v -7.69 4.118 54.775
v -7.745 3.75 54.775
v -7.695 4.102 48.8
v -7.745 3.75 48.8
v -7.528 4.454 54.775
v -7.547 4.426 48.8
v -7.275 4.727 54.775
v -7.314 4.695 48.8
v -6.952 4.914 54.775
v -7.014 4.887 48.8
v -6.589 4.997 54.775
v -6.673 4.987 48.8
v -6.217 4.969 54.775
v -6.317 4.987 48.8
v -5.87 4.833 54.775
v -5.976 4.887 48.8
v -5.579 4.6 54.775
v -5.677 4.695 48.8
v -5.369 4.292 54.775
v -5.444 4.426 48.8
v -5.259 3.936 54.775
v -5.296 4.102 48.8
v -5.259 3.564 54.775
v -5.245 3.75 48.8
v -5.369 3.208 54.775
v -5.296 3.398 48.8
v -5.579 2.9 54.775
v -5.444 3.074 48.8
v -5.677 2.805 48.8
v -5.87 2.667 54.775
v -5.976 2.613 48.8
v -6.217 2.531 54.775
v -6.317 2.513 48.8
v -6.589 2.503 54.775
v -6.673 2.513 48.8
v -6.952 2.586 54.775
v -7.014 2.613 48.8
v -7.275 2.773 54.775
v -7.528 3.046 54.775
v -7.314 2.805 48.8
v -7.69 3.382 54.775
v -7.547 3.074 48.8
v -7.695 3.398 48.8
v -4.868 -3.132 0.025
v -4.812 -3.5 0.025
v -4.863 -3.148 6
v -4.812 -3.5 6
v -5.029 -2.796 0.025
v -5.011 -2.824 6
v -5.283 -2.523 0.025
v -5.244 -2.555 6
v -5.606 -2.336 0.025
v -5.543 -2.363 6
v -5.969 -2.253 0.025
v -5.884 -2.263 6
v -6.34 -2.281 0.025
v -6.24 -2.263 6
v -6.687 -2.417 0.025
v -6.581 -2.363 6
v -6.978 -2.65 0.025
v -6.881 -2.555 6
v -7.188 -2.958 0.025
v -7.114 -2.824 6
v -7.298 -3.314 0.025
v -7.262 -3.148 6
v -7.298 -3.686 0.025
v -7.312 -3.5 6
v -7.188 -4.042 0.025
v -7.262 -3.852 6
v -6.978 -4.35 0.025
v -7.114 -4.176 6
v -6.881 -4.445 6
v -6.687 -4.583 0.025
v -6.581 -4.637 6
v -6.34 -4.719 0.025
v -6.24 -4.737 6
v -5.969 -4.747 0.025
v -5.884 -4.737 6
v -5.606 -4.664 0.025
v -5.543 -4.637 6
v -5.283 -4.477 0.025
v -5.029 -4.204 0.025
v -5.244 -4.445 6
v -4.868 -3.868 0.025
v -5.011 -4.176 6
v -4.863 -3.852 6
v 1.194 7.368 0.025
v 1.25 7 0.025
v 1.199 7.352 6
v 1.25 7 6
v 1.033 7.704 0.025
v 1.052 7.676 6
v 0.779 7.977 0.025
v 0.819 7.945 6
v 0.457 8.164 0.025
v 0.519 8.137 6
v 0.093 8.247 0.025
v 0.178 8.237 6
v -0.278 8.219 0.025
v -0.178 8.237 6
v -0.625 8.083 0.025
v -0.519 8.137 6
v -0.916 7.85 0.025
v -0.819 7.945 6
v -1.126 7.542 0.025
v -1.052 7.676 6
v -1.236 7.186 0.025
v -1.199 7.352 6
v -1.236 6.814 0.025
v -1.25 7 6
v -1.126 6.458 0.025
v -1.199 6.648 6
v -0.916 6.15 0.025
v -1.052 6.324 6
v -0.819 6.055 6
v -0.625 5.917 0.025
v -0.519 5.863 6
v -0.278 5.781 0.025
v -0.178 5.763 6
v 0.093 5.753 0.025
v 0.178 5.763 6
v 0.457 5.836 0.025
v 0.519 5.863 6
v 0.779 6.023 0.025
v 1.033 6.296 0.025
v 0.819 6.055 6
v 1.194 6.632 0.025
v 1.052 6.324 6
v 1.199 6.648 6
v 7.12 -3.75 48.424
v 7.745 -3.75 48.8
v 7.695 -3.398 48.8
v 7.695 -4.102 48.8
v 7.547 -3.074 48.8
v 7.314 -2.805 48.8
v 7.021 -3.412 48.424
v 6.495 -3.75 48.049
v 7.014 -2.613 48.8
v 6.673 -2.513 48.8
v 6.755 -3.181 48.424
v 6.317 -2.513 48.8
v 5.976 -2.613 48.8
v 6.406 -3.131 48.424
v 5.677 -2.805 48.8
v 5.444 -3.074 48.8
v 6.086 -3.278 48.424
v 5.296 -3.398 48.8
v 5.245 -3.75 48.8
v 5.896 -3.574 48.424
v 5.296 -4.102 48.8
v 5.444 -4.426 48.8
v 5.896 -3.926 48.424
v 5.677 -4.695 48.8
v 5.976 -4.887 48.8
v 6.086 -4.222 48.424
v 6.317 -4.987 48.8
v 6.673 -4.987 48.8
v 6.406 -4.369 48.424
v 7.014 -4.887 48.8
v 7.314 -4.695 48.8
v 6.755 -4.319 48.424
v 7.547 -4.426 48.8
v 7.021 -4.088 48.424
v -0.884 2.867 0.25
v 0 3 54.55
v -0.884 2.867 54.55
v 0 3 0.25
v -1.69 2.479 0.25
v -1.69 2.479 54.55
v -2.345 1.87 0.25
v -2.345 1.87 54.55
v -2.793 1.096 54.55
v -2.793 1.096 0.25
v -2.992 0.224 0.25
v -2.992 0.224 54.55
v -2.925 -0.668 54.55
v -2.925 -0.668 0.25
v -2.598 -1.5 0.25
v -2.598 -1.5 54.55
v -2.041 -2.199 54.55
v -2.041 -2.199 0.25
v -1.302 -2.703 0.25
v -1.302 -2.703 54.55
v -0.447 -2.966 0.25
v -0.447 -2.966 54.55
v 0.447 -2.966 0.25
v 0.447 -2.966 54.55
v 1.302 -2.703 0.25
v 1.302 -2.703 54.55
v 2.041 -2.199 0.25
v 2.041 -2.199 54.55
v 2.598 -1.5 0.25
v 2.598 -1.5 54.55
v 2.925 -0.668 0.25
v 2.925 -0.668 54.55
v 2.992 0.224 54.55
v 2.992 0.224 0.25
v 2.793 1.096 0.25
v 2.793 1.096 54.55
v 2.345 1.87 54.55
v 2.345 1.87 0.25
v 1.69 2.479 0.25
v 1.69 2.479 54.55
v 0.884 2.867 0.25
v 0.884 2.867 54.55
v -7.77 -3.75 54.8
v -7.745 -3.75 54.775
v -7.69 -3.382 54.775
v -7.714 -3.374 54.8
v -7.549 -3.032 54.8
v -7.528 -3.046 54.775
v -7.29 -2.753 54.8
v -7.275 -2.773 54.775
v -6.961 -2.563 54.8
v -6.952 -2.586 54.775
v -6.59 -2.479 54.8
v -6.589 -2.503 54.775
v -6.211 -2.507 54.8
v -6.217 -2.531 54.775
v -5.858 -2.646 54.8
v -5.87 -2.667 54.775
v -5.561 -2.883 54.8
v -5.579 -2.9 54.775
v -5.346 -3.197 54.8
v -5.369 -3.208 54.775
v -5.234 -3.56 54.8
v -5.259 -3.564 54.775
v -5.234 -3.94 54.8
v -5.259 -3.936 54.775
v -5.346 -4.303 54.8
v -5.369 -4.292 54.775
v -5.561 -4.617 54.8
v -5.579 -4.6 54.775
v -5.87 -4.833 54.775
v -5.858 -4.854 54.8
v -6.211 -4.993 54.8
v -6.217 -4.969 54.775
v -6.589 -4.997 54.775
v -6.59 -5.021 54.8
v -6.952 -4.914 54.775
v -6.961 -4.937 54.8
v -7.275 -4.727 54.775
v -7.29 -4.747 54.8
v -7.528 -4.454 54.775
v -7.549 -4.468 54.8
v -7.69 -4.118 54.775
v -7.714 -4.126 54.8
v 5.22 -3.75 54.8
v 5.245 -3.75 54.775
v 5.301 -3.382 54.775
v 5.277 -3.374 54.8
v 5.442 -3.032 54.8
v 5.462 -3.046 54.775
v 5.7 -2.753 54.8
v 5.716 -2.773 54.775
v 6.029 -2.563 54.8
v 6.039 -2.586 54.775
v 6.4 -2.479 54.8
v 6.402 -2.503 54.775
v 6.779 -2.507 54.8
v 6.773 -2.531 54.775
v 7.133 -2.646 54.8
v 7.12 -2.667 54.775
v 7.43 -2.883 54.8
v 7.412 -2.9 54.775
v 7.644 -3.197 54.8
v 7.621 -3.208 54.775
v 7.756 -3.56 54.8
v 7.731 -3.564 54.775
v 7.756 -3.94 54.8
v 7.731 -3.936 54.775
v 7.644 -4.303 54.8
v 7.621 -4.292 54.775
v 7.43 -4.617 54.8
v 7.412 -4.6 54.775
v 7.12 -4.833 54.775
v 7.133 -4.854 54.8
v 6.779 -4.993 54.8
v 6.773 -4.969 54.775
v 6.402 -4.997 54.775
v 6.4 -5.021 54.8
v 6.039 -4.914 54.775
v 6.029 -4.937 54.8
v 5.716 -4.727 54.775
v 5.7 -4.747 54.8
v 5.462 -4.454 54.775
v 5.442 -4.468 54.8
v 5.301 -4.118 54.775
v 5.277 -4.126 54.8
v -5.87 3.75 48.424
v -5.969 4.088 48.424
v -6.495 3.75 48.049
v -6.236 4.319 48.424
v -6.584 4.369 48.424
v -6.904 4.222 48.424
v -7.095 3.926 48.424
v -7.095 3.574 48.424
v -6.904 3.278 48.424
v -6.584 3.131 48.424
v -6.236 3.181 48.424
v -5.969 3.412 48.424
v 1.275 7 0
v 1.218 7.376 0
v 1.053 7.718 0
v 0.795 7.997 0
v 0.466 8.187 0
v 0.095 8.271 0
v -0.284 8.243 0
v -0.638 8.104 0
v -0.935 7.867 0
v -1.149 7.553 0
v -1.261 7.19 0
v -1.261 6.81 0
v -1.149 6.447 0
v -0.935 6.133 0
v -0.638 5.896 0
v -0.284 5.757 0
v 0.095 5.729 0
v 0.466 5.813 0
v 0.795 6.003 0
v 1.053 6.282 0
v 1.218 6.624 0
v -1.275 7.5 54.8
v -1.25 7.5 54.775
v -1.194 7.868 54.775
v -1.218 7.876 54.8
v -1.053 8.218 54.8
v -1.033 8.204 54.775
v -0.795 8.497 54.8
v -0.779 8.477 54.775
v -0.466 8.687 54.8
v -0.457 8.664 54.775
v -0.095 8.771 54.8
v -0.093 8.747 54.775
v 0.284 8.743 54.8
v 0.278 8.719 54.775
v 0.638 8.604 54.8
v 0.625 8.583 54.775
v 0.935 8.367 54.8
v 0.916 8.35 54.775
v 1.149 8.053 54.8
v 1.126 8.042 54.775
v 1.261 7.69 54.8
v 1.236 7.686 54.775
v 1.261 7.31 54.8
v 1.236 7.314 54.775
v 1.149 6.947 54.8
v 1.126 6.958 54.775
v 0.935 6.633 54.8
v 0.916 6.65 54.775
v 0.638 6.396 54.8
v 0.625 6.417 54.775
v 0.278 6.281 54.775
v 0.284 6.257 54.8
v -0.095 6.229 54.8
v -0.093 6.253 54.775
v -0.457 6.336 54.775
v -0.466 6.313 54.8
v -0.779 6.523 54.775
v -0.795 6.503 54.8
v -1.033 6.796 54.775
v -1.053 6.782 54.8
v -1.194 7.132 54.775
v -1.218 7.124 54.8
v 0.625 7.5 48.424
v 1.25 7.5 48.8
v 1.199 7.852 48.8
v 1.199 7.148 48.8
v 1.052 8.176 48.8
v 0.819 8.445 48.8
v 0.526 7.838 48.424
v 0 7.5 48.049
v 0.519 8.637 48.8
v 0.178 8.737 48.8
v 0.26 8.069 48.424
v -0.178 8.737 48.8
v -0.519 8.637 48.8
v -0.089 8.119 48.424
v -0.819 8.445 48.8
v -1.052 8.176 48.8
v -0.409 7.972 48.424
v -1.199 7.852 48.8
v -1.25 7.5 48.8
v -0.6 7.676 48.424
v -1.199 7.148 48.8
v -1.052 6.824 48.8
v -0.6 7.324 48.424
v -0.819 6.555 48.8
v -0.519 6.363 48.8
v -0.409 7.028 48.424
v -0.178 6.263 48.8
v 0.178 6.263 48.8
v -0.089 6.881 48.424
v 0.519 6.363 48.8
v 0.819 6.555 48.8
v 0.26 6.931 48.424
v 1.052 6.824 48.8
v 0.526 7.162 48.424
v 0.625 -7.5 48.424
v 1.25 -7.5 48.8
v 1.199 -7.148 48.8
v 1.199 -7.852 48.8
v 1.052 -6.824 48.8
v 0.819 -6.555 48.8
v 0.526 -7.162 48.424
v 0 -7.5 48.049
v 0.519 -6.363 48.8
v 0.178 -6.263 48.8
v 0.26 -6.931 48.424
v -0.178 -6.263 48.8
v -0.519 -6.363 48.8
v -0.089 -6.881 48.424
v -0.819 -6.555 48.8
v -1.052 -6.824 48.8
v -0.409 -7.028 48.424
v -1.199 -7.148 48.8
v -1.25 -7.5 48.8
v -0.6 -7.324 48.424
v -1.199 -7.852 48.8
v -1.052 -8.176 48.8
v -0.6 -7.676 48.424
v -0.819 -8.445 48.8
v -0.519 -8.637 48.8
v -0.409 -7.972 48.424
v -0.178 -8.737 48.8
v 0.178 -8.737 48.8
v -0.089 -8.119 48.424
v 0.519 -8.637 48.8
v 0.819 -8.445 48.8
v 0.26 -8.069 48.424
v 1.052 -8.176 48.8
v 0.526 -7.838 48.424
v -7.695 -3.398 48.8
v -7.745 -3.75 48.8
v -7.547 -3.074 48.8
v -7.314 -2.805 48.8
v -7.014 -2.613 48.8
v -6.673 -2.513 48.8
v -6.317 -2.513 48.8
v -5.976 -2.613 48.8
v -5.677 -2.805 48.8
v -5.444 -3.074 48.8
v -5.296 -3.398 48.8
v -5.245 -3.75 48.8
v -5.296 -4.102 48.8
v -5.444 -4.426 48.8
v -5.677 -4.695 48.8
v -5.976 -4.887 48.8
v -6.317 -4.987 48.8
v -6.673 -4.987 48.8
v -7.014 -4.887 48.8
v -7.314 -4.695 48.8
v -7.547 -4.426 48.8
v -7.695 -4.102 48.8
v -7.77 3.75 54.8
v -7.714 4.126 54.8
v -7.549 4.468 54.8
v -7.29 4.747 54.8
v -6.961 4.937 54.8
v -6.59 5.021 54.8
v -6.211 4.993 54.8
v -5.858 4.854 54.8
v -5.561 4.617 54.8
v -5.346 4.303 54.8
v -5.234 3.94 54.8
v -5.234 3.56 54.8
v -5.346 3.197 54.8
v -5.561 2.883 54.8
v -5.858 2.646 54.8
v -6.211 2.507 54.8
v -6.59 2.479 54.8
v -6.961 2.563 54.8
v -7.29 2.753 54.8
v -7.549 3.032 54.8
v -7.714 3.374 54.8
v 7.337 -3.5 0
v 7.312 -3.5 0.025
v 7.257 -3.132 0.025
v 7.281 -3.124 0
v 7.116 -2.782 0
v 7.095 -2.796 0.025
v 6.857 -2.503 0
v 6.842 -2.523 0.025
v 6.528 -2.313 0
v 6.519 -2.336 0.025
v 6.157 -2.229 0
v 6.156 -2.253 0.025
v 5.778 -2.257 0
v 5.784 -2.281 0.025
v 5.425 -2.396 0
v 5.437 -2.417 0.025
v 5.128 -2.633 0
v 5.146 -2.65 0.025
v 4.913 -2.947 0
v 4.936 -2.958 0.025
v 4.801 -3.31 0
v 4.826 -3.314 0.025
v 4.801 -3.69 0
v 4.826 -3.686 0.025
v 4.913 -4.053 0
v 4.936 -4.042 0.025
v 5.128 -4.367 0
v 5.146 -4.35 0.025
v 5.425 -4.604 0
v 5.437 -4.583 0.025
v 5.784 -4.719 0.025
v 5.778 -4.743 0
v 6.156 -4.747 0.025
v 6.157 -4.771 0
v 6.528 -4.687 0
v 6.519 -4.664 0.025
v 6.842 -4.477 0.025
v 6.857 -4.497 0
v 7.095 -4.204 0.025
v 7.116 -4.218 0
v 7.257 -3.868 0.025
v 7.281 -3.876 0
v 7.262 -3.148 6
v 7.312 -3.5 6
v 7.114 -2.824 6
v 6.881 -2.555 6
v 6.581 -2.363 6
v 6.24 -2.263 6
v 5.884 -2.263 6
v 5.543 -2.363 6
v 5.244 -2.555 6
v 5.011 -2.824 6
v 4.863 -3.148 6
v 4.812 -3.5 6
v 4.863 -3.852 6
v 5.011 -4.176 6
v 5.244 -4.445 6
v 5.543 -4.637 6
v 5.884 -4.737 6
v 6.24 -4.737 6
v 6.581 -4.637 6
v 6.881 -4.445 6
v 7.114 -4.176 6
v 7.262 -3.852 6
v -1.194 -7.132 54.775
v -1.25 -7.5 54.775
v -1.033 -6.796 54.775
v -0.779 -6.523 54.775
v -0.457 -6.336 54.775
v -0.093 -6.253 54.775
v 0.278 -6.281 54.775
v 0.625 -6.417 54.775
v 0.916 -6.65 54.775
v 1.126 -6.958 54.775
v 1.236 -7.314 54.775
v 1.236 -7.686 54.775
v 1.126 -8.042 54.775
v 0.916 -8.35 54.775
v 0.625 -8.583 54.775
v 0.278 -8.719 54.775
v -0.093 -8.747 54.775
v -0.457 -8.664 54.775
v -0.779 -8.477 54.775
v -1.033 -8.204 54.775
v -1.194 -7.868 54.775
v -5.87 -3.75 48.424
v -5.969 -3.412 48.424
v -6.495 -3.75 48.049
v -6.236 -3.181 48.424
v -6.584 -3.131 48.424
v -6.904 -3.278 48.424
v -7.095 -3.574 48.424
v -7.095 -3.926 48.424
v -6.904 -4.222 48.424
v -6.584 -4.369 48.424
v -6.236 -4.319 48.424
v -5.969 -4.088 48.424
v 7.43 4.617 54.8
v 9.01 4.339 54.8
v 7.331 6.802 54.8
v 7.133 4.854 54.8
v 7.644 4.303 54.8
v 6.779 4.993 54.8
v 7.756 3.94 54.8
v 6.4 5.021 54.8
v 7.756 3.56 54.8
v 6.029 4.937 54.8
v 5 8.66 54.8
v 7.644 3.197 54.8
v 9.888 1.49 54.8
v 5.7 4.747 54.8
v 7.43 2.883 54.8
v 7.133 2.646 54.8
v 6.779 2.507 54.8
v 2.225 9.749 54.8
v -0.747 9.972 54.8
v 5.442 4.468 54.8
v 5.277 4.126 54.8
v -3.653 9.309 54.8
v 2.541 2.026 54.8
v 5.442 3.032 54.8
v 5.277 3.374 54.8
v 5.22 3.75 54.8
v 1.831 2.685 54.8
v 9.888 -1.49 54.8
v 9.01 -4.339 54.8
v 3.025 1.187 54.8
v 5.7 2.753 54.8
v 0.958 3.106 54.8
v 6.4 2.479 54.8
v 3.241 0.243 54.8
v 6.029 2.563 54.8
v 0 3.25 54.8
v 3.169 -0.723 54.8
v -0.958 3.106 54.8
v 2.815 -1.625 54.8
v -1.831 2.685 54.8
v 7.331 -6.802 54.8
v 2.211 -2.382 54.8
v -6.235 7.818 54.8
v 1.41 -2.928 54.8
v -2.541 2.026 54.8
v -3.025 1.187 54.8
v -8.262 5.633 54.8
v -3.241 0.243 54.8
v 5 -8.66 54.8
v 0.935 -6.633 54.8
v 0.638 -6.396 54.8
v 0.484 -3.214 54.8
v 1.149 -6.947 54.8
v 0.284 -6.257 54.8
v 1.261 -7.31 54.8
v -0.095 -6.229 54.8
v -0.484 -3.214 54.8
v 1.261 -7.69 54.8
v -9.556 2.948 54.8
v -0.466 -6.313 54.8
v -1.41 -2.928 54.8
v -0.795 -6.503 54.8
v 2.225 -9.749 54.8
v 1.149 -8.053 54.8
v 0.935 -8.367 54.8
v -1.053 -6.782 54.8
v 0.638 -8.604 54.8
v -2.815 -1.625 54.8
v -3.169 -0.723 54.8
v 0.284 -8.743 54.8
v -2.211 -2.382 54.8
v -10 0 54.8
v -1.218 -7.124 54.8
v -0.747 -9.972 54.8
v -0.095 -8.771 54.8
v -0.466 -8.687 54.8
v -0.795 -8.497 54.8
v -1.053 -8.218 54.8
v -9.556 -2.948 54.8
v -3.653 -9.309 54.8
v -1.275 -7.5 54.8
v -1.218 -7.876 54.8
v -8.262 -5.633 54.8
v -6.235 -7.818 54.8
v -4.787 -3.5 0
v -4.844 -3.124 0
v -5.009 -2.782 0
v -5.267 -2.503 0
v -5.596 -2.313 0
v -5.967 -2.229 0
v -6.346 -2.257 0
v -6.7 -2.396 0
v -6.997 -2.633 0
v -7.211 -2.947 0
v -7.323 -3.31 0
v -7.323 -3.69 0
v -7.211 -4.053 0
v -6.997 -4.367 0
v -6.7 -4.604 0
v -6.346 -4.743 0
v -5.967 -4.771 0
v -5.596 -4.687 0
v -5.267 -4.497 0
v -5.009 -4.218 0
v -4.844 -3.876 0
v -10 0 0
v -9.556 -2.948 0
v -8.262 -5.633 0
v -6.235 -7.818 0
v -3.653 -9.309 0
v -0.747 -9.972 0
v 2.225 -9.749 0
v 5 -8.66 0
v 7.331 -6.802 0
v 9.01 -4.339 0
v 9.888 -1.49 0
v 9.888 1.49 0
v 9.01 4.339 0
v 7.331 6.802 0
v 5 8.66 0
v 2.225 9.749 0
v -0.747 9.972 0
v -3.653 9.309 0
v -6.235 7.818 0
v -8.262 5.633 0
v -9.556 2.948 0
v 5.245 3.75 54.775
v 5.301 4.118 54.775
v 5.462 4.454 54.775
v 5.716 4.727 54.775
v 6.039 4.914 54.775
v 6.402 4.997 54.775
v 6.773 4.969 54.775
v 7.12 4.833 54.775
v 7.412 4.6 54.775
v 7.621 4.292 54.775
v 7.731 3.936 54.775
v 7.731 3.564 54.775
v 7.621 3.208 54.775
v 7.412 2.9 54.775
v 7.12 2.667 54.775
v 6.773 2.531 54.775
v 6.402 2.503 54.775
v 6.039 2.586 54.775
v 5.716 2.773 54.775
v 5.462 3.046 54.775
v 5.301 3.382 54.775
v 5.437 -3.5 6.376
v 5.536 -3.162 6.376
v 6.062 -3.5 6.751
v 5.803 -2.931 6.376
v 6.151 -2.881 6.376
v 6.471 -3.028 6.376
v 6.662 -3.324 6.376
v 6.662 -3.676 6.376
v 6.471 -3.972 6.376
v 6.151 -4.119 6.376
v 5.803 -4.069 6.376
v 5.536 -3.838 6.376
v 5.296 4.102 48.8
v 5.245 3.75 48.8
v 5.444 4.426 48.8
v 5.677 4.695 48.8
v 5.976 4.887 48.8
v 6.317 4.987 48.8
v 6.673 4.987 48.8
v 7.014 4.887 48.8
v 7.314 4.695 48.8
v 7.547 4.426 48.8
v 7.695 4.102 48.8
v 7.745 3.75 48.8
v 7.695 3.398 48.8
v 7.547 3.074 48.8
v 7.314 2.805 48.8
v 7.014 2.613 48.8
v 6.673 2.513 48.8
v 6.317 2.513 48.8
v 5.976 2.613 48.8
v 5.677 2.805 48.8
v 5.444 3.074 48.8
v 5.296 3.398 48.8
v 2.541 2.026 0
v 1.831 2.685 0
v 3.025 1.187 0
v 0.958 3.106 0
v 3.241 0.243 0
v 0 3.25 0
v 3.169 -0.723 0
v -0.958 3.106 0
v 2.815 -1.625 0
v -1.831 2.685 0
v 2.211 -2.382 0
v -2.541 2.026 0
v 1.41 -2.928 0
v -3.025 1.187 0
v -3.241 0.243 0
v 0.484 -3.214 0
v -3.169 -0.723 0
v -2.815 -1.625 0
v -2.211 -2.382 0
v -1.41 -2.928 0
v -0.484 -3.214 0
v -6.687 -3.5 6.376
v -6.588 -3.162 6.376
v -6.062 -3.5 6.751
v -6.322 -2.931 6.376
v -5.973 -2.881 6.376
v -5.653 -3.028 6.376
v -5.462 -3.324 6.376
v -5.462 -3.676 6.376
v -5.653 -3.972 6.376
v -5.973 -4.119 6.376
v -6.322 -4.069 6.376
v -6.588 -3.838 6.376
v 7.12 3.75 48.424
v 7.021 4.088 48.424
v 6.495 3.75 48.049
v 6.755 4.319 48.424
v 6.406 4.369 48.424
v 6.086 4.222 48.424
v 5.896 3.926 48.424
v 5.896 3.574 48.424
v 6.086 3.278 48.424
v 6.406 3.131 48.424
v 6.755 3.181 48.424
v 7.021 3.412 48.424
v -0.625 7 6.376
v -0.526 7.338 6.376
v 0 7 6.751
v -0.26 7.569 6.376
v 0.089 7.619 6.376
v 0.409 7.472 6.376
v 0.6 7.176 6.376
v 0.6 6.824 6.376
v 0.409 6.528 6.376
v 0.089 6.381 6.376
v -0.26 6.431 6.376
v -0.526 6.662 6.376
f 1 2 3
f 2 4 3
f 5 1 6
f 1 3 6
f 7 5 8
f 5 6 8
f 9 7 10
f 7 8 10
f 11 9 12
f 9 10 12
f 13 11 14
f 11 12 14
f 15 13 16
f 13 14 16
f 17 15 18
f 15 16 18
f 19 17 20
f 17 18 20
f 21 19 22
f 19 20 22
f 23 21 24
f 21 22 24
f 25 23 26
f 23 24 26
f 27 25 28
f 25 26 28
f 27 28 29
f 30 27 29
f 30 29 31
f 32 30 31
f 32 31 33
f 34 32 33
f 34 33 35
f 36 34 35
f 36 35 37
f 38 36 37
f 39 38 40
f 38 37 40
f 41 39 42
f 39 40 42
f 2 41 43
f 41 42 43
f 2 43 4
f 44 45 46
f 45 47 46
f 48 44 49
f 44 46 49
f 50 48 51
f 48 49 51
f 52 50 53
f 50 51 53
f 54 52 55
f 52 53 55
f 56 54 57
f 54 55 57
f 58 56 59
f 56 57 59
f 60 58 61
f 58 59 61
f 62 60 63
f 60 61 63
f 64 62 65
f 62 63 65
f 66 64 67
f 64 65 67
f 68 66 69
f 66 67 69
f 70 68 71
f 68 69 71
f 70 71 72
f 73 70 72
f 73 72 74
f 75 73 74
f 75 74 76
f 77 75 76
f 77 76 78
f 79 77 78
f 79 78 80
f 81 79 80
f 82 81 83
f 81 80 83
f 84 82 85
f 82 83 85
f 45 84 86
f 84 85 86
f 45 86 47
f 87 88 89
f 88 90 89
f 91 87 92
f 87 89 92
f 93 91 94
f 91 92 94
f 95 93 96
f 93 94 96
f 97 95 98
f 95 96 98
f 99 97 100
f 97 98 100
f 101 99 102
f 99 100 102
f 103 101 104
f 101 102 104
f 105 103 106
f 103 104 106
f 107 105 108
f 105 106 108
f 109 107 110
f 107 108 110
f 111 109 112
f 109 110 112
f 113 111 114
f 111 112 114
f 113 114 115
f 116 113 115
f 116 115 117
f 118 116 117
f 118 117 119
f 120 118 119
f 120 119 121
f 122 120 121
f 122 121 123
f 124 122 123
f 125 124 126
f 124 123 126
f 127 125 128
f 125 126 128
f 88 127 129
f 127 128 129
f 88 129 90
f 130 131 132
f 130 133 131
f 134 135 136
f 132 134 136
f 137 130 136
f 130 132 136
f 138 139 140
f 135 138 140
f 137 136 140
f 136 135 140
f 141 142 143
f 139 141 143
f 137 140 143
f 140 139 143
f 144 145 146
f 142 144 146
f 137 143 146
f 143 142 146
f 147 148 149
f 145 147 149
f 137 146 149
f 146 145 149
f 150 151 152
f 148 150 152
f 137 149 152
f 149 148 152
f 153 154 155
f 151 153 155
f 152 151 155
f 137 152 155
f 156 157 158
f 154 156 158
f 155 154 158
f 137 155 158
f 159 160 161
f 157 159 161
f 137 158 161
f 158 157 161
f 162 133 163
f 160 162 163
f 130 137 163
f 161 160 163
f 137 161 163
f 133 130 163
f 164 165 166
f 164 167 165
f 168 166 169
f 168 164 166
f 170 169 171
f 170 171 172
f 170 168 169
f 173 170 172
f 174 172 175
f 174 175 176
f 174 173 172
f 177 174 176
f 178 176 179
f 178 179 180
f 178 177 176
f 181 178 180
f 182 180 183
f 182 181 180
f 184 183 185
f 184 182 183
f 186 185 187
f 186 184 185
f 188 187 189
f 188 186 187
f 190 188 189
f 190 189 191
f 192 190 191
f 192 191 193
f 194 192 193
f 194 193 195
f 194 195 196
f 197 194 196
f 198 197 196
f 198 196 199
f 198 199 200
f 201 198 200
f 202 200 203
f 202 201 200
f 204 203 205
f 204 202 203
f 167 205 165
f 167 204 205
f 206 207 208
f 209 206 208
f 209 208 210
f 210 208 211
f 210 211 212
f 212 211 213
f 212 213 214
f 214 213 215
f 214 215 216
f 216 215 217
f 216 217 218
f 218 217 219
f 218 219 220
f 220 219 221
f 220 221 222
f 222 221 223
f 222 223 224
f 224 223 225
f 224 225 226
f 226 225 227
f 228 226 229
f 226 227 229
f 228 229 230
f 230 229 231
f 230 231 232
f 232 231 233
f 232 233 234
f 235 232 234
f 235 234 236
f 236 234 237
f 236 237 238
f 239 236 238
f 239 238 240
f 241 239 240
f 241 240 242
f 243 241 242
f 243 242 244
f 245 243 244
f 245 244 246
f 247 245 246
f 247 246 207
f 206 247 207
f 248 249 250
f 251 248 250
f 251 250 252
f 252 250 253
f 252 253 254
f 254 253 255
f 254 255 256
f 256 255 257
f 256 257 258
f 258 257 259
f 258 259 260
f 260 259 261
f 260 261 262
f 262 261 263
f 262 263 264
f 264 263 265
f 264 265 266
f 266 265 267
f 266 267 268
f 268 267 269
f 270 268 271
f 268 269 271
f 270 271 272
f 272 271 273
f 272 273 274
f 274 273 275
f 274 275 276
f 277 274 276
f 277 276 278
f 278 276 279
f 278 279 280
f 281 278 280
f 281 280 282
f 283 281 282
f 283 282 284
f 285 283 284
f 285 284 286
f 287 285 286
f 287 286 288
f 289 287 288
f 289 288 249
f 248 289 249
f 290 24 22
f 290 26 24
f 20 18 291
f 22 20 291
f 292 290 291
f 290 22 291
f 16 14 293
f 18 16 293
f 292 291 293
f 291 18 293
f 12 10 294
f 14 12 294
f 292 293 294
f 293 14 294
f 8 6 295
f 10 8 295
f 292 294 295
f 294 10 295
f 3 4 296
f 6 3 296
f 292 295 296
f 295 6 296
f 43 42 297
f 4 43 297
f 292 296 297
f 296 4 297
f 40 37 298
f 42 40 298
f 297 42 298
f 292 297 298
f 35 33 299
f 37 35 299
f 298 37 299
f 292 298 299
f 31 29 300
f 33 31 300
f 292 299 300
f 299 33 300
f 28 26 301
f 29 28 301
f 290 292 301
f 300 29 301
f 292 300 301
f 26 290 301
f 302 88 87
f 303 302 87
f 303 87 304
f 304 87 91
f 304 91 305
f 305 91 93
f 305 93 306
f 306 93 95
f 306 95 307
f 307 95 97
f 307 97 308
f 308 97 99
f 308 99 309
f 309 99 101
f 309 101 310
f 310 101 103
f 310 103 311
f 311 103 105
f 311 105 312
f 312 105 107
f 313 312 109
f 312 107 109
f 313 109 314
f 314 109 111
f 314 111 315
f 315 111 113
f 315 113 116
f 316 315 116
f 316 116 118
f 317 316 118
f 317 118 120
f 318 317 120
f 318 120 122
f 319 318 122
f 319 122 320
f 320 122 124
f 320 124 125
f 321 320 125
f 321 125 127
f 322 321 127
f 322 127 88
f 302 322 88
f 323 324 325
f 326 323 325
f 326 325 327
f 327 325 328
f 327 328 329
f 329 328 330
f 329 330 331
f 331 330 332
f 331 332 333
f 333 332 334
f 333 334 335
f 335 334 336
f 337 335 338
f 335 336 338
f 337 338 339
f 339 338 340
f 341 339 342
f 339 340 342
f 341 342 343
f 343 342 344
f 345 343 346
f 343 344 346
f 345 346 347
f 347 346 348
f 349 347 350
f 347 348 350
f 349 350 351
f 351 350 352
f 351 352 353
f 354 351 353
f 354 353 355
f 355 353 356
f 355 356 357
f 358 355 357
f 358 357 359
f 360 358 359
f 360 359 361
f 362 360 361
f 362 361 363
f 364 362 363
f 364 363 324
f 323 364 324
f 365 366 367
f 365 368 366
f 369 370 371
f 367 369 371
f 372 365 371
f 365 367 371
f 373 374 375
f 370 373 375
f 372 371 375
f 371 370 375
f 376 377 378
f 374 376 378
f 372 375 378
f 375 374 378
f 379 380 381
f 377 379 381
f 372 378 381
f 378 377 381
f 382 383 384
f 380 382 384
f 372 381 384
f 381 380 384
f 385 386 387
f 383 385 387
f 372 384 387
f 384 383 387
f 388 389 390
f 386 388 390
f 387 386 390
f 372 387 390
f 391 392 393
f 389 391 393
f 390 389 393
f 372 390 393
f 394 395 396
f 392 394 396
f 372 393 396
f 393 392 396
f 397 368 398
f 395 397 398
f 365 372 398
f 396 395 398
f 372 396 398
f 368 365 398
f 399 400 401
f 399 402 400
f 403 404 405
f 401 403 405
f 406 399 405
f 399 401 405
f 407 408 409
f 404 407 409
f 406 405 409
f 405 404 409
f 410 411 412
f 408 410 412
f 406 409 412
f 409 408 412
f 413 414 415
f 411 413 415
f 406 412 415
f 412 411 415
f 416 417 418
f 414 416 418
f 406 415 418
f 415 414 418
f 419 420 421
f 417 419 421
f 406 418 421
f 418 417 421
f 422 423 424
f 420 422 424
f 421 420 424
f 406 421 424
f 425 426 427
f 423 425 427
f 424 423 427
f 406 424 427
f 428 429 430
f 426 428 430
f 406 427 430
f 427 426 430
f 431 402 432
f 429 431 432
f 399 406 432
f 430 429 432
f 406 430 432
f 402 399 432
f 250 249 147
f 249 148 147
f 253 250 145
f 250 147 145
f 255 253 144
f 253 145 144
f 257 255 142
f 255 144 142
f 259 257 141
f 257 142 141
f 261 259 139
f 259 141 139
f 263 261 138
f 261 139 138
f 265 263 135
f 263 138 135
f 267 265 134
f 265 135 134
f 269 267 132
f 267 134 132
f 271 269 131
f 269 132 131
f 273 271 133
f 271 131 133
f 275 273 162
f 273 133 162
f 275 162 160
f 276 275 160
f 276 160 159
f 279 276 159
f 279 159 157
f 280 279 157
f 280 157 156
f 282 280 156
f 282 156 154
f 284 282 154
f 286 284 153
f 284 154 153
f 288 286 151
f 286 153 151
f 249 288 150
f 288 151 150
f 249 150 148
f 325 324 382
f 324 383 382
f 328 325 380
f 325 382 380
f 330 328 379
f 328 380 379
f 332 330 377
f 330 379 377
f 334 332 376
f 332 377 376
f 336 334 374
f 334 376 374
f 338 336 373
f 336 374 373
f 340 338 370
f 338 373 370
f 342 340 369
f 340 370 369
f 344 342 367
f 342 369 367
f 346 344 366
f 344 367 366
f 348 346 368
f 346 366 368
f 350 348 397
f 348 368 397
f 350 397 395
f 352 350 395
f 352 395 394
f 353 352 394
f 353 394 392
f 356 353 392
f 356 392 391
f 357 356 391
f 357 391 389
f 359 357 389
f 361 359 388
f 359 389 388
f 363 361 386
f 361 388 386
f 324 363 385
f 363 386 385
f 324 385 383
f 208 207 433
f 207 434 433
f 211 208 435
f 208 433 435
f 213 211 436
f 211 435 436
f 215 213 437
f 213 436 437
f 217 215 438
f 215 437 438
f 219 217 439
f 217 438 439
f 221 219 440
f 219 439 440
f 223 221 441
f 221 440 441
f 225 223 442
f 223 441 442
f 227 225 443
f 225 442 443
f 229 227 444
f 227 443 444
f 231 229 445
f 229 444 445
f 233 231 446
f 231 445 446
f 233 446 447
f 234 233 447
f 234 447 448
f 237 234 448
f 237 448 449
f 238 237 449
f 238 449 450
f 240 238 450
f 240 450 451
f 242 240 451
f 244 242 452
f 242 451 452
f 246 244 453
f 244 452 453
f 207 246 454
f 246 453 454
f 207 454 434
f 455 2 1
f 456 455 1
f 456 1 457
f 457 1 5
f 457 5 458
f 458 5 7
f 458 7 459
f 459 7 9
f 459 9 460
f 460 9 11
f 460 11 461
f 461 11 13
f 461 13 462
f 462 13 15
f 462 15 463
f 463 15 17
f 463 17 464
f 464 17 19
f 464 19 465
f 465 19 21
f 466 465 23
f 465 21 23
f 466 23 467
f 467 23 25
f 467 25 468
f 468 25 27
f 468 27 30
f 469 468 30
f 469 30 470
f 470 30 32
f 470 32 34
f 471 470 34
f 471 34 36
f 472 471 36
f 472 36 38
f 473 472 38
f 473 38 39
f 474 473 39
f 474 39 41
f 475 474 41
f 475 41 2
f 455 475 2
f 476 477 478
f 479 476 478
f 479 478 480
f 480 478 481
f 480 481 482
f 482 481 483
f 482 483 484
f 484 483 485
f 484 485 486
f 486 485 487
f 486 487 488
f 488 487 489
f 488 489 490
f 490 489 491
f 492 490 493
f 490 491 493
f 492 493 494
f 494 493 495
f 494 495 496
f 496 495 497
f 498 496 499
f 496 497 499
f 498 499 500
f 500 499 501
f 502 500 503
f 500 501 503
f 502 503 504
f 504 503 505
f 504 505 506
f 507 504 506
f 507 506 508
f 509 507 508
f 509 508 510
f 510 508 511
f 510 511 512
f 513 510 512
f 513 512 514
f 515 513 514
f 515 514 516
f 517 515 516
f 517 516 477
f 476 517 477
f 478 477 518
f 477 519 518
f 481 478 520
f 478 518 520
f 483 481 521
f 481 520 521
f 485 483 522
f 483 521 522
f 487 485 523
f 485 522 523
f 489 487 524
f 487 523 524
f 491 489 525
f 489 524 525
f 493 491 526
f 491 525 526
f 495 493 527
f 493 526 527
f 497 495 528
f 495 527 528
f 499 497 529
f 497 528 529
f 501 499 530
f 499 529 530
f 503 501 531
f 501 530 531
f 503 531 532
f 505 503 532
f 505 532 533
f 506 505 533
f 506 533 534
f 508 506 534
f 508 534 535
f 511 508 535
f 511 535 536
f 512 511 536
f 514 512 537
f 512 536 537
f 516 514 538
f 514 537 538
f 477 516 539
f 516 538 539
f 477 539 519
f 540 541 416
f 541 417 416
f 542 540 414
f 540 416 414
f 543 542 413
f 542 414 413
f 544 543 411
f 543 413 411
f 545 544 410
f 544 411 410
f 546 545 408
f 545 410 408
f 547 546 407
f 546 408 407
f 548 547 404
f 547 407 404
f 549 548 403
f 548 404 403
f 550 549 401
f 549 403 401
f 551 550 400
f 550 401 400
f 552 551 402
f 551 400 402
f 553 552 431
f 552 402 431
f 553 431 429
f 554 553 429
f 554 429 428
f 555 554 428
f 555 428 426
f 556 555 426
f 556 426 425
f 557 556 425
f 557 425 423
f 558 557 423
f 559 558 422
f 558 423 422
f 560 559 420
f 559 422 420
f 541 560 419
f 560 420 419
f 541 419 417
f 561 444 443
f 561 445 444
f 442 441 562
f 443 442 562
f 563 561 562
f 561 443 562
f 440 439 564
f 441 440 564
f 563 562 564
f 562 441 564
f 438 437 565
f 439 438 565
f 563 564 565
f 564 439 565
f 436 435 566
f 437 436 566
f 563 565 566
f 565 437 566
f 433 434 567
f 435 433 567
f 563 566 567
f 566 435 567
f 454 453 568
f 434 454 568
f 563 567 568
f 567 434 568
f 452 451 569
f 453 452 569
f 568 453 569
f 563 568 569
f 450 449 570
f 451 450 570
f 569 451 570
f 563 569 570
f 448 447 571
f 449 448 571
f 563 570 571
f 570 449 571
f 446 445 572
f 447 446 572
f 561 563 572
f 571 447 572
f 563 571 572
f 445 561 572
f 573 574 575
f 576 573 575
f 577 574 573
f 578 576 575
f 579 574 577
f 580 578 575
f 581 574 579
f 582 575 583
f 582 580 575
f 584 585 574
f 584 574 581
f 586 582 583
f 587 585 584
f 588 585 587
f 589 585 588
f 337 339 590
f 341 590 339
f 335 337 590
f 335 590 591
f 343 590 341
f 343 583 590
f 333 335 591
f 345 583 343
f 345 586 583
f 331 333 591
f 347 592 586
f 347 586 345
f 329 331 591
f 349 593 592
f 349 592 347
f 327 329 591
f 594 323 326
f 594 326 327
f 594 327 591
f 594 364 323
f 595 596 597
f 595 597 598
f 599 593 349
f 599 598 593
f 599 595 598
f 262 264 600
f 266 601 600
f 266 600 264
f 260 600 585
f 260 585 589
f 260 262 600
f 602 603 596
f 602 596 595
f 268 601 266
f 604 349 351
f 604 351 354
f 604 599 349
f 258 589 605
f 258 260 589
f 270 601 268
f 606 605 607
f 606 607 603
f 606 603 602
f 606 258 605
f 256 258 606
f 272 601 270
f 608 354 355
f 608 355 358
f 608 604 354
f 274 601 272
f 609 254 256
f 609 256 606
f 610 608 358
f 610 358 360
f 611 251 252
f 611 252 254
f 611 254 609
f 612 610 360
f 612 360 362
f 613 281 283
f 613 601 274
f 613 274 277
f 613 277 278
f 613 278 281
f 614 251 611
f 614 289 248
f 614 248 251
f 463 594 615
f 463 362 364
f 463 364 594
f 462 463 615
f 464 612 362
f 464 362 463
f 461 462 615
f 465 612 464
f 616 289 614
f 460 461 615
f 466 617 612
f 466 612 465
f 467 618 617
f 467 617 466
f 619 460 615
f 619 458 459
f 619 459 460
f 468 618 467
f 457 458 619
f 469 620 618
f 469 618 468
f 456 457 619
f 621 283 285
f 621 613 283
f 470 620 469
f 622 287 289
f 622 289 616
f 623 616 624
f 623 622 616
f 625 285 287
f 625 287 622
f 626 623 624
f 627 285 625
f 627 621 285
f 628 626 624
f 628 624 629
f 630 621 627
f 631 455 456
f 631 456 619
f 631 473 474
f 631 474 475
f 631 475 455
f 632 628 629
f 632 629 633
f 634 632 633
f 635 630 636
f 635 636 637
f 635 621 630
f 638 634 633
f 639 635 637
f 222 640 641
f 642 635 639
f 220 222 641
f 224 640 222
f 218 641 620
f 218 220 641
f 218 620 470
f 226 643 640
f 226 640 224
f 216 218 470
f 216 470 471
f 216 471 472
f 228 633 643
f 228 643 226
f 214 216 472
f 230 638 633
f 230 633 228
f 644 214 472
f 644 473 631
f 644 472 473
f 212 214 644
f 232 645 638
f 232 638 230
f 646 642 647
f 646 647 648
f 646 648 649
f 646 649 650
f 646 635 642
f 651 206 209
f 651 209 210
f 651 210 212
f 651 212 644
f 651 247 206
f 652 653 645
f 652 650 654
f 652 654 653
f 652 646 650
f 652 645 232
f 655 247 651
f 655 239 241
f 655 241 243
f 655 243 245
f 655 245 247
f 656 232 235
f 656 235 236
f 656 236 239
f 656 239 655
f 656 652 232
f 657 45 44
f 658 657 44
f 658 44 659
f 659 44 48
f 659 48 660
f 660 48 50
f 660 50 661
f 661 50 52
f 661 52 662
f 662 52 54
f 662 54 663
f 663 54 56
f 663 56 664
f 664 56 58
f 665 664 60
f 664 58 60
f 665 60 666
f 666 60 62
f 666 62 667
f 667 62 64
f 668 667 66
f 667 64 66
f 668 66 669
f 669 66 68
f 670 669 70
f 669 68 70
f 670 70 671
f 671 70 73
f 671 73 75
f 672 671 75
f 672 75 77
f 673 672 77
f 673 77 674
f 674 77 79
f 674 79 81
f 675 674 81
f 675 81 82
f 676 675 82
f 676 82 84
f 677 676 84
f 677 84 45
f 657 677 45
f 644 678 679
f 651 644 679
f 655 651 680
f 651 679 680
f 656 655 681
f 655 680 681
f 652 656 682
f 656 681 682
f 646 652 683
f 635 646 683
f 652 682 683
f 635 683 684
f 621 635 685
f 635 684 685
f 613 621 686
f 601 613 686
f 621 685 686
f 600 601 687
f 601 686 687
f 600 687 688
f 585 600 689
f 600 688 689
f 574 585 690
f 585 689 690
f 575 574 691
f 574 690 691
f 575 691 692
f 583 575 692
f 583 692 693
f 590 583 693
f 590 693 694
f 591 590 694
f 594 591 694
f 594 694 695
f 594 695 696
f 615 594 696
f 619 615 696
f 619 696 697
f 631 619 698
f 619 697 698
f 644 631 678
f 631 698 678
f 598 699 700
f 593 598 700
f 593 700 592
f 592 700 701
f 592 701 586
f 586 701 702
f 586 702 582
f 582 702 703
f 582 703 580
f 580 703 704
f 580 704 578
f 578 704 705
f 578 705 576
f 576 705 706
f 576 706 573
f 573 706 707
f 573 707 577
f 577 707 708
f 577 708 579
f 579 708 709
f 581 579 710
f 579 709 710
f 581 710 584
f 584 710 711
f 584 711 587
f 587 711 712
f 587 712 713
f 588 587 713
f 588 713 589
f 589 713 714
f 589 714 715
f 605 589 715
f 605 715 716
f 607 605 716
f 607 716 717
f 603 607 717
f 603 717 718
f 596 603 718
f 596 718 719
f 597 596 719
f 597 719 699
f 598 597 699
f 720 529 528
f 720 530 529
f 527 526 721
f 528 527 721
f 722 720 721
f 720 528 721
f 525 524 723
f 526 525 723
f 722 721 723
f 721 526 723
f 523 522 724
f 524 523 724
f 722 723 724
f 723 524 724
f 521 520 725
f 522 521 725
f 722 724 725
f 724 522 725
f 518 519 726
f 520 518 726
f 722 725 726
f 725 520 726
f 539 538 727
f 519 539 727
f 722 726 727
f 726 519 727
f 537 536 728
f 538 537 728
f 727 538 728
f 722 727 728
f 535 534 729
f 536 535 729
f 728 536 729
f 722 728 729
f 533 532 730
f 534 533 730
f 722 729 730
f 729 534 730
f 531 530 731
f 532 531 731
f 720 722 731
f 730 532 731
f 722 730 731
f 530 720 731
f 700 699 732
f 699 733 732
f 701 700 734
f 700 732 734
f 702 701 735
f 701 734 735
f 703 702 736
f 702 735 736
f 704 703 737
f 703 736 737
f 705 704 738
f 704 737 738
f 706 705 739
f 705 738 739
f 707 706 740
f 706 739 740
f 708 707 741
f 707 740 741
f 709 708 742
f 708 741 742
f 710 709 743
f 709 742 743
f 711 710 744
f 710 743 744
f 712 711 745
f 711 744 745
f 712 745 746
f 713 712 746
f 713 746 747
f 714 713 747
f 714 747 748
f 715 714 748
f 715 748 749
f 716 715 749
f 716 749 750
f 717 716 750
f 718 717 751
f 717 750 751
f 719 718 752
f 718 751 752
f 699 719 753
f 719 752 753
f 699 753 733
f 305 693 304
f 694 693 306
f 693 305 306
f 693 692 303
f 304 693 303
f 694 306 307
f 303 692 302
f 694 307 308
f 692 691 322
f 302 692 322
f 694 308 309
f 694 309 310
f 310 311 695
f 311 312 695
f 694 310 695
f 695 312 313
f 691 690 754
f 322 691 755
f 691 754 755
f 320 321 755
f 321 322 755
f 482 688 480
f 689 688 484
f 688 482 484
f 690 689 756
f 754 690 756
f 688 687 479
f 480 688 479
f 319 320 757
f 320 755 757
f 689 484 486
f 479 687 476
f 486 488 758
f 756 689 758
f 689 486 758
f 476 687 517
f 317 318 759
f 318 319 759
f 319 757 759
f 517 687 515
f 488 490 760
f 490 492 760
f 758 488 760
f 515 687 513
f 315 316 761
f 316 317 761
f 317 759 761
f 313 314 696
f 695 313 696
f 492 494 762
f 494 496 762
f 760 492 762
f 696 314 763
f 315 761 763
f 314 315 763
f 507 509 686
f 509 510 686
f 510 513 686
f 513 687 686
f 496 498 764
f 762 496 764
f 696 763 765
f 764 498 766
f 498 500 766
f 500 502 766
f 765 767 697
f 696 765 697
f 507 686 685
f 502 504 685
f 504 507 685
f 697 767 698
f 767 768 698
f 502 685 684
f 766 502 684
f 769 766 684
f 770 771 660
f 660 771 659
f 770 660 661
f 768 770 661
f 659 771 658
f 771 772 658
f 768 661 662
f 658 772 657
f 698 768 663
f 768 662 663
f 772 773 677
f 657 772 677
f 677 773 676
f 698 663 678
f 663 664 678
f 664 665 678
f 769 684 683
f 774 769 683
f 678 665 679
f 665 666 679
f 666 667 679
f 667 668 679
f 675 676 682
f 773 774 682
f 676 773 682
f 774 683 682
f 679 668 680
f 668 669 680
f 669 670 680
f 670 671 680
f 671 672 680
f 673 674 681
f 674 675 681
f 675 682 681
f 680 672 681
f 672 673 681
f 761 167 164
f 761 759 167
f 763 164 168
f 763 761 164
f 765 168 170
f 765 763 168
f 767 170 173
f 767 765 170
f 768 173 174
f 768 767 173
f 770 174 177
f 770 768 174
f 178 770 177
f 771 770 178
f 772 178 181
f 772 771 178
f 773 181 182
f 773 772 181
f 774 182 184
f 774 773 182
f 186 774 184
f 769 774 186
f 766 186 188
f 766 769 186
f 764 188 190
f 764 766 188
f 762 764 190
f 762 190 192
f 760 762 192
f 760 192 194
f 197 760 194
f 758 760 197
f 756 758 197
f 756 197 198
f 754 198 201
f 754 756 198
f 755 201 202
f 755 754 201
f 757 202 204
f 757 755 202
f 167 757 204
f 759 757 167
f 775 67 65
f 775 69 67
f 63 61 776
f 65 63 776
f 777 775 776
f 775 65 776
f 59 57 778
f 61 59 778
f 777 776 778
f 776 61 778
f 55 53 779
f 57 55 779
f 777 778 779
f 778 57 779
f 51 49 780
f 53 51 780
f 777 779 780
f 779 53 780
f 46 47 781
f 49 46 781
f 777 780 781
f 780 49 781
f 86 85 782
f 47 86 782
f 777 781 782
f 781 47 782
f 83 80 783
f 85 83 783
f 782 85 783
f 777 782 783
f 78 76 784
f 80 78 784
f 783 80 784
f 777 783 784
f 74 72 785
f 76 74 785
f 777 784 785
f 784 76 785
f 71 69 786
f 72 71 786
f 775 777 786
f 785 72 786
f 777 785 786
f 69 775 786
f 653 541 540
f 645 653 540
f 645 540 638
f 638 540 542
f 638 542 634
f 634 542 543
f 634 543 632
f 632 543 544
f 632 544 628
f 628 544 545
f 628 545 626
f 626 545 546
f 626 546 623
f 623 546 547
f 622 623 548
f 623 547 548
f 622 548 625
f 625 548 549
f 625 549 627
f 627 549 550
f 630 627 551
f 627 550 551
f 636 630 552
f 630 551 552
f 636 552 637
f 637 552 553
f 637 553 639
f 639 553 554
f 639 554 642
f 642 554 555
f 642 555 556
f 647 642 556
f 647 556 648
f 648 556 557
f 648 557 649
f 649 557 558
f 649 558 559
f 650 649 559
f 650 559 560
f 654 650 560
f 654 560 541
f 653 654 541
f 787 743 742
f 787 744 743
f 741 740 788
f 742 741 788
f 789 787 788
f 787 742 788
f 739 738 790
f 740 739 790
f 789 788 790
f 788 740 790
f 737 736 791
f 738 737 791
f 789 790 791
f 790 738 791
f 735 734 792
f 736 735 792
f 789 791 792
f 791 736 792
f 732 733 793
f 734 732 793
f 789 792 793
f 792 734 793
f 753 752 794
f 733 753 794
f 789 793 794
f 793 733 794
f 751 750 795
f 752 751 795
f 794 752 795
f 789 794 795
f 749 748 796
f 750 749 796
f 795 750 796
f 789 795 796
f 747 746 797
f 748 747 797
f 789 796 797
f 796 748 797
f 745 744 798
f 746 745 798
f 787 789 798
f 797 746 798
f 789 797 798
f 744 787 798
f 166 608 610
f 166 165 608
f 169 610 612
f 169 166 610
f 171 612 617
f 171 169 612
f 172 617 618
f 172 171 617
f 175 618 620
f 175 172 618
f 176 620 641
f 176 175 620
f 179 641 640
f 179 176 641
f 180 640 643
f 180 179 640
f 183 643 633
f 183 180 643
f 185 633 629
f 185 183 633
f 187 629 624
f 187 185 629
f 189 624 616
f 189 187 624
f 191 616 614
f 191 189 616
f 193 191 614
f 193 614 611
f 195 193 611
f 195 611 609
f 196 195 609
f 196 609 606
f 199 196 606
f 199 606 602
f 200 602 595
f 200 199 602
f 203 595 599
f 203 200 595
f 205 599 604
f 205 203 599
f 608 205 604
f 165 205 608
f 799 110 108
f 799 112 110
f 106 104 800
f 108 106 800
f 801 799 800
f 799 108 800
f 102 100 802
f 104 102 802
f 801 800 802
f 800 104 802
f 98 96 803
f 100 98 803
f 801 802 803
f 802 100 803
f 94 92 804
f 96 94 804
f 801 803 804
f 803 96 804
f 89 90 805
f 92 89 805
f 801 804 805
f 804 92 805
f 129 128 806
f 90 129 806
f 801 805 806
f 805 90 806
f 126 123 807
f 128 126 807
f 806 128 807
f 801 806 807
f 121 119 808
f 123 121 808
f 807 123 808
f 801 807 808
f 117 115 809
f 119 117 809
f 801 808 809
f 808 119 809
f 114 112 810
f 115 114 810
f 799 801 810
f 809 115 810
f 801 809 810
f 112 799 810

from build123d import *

# Parameters (mm, degrees)
SKETCH1_R                         = 10
BOSS_EXTRUDE1_DEPTH               = 54.8
TAP_DRILL_FOR_M3_TAP1_D           = 2.5
TAP_DRILL_FOR_M3_TAP1_DEPTH       = 6
TAP_DRILL_FOR_M3_TAP1_CSINK_D     = 2.55
TAP_DRILL_FOR_M3_TAP1_CSINK_ANGLE = 90
TAP_DRILL_FOR_M3_TAP1_TIP         = 0.751075774
TAP_DRILL_FOR_M3_TAP2_D           = 2.5
TAP_DRILL_FOR_M3_TAP2_DEPTH       = 6
TAP_DRILL_FOR_M3_TAP2_CSINK_D     = 2.55
TAP_DRILL_FOR_M3_TAP2_CSINK_ANGLE = 90
TAP_DRILL_FOR_M3_TAP2_TIP         = 0.751075774


with BuildPart() as part:
    # Sketch1 → Boss-Extrude1 (new body)
    with BuildSketch(Plane.XY):
        with Locations(Location((0, 0, 0), (0, 0, 180))):
            Circle(SKETCH1_R)
    extrude(amount=BOSS_EXTRUDE1_DEPTH)

    # Sketch4 → Ø6.0mm Dowel Hole1 (revolve, cut)
    with BuildSketch(Plane.YZ):
        Polygon((0, 0), (0, 54.8), (3.25, 54.8), (3, 54.55), (3, 0.25), (3.25, 0), align=None)
    revolve(axis=Axis((0, 0, -6.35), (0, 0, 1)), mode=Mode.SUBTRACT)

    # Tap Drill for M3 Tap1
    with Locations(Plane(origin=(0, 0, 0), x_dir=(-1, 0, 0), z_dir=(0, 0, -1))):
        with Locations((-6.062177826, -3.5), (0, 7), (6.062177826, -3.5)):
            CounterSinkHole(TAP_DRILL_FOR_M3_TAP1_D / 2, TAP_DRILL_FOR_M3_TAP1_CSINK_D / 2, depth=TAP_DRILL_FOR_M3_TAP1_DEPTH, counter_sink_angle=TAP_DRILL_FOR_M3_TAP1_CSINK_ANGLE)
            with Locations((0, 0, -(TAP_DRILL_FOR_M3_TAP1_DEPTH + TAP_DRILL_FOR_M3_TAP1_TIP / 2))):  # 118° drill point
                Cone(0, TAP_DRILL_FOR_M3_TAP1_D / 2, TAP_DRILL_FOR_M3_TAP1_TIP, mode=Mode.SUBTRACT)

    # Tap Drill for M3 Tap2
    with Locations(Plane.XY.offset(54.8)):
        with Locations((-6.495190528, 3.75), (0, 7.5), (6.495190528, 3.75), (6.495190528, -3.75), (0, -7.5), (-6.495190528, -3.75)):
            CounterSinkHole(TAP_DRILL_FOR_M3_TAP2_D / 2, TAP_DRILL_FOR_M3_TAP2_CSINK_D / 2, depth=TAP_DRILL_FOR_M3_TAP2_DEPTH, counter_sink_angle=TAP_DRILL_FOR_M3_TAP2_CSINK_ANGLE)
            with Locations((0, 0, -(TAP_DRILL_FOR_M3_TAP2_DEPTH + TAP_DRILL_FOR_M3_TAP2_TIP / 2))):  # 118° drill point
                Cone(0, TAP_DRILL_FOR_M3_TAP2_D / 2, TAP_DRILL_FOR_M3_TAP2_TIP, mode=Mode.SUBTRACT)


solid = part.part
